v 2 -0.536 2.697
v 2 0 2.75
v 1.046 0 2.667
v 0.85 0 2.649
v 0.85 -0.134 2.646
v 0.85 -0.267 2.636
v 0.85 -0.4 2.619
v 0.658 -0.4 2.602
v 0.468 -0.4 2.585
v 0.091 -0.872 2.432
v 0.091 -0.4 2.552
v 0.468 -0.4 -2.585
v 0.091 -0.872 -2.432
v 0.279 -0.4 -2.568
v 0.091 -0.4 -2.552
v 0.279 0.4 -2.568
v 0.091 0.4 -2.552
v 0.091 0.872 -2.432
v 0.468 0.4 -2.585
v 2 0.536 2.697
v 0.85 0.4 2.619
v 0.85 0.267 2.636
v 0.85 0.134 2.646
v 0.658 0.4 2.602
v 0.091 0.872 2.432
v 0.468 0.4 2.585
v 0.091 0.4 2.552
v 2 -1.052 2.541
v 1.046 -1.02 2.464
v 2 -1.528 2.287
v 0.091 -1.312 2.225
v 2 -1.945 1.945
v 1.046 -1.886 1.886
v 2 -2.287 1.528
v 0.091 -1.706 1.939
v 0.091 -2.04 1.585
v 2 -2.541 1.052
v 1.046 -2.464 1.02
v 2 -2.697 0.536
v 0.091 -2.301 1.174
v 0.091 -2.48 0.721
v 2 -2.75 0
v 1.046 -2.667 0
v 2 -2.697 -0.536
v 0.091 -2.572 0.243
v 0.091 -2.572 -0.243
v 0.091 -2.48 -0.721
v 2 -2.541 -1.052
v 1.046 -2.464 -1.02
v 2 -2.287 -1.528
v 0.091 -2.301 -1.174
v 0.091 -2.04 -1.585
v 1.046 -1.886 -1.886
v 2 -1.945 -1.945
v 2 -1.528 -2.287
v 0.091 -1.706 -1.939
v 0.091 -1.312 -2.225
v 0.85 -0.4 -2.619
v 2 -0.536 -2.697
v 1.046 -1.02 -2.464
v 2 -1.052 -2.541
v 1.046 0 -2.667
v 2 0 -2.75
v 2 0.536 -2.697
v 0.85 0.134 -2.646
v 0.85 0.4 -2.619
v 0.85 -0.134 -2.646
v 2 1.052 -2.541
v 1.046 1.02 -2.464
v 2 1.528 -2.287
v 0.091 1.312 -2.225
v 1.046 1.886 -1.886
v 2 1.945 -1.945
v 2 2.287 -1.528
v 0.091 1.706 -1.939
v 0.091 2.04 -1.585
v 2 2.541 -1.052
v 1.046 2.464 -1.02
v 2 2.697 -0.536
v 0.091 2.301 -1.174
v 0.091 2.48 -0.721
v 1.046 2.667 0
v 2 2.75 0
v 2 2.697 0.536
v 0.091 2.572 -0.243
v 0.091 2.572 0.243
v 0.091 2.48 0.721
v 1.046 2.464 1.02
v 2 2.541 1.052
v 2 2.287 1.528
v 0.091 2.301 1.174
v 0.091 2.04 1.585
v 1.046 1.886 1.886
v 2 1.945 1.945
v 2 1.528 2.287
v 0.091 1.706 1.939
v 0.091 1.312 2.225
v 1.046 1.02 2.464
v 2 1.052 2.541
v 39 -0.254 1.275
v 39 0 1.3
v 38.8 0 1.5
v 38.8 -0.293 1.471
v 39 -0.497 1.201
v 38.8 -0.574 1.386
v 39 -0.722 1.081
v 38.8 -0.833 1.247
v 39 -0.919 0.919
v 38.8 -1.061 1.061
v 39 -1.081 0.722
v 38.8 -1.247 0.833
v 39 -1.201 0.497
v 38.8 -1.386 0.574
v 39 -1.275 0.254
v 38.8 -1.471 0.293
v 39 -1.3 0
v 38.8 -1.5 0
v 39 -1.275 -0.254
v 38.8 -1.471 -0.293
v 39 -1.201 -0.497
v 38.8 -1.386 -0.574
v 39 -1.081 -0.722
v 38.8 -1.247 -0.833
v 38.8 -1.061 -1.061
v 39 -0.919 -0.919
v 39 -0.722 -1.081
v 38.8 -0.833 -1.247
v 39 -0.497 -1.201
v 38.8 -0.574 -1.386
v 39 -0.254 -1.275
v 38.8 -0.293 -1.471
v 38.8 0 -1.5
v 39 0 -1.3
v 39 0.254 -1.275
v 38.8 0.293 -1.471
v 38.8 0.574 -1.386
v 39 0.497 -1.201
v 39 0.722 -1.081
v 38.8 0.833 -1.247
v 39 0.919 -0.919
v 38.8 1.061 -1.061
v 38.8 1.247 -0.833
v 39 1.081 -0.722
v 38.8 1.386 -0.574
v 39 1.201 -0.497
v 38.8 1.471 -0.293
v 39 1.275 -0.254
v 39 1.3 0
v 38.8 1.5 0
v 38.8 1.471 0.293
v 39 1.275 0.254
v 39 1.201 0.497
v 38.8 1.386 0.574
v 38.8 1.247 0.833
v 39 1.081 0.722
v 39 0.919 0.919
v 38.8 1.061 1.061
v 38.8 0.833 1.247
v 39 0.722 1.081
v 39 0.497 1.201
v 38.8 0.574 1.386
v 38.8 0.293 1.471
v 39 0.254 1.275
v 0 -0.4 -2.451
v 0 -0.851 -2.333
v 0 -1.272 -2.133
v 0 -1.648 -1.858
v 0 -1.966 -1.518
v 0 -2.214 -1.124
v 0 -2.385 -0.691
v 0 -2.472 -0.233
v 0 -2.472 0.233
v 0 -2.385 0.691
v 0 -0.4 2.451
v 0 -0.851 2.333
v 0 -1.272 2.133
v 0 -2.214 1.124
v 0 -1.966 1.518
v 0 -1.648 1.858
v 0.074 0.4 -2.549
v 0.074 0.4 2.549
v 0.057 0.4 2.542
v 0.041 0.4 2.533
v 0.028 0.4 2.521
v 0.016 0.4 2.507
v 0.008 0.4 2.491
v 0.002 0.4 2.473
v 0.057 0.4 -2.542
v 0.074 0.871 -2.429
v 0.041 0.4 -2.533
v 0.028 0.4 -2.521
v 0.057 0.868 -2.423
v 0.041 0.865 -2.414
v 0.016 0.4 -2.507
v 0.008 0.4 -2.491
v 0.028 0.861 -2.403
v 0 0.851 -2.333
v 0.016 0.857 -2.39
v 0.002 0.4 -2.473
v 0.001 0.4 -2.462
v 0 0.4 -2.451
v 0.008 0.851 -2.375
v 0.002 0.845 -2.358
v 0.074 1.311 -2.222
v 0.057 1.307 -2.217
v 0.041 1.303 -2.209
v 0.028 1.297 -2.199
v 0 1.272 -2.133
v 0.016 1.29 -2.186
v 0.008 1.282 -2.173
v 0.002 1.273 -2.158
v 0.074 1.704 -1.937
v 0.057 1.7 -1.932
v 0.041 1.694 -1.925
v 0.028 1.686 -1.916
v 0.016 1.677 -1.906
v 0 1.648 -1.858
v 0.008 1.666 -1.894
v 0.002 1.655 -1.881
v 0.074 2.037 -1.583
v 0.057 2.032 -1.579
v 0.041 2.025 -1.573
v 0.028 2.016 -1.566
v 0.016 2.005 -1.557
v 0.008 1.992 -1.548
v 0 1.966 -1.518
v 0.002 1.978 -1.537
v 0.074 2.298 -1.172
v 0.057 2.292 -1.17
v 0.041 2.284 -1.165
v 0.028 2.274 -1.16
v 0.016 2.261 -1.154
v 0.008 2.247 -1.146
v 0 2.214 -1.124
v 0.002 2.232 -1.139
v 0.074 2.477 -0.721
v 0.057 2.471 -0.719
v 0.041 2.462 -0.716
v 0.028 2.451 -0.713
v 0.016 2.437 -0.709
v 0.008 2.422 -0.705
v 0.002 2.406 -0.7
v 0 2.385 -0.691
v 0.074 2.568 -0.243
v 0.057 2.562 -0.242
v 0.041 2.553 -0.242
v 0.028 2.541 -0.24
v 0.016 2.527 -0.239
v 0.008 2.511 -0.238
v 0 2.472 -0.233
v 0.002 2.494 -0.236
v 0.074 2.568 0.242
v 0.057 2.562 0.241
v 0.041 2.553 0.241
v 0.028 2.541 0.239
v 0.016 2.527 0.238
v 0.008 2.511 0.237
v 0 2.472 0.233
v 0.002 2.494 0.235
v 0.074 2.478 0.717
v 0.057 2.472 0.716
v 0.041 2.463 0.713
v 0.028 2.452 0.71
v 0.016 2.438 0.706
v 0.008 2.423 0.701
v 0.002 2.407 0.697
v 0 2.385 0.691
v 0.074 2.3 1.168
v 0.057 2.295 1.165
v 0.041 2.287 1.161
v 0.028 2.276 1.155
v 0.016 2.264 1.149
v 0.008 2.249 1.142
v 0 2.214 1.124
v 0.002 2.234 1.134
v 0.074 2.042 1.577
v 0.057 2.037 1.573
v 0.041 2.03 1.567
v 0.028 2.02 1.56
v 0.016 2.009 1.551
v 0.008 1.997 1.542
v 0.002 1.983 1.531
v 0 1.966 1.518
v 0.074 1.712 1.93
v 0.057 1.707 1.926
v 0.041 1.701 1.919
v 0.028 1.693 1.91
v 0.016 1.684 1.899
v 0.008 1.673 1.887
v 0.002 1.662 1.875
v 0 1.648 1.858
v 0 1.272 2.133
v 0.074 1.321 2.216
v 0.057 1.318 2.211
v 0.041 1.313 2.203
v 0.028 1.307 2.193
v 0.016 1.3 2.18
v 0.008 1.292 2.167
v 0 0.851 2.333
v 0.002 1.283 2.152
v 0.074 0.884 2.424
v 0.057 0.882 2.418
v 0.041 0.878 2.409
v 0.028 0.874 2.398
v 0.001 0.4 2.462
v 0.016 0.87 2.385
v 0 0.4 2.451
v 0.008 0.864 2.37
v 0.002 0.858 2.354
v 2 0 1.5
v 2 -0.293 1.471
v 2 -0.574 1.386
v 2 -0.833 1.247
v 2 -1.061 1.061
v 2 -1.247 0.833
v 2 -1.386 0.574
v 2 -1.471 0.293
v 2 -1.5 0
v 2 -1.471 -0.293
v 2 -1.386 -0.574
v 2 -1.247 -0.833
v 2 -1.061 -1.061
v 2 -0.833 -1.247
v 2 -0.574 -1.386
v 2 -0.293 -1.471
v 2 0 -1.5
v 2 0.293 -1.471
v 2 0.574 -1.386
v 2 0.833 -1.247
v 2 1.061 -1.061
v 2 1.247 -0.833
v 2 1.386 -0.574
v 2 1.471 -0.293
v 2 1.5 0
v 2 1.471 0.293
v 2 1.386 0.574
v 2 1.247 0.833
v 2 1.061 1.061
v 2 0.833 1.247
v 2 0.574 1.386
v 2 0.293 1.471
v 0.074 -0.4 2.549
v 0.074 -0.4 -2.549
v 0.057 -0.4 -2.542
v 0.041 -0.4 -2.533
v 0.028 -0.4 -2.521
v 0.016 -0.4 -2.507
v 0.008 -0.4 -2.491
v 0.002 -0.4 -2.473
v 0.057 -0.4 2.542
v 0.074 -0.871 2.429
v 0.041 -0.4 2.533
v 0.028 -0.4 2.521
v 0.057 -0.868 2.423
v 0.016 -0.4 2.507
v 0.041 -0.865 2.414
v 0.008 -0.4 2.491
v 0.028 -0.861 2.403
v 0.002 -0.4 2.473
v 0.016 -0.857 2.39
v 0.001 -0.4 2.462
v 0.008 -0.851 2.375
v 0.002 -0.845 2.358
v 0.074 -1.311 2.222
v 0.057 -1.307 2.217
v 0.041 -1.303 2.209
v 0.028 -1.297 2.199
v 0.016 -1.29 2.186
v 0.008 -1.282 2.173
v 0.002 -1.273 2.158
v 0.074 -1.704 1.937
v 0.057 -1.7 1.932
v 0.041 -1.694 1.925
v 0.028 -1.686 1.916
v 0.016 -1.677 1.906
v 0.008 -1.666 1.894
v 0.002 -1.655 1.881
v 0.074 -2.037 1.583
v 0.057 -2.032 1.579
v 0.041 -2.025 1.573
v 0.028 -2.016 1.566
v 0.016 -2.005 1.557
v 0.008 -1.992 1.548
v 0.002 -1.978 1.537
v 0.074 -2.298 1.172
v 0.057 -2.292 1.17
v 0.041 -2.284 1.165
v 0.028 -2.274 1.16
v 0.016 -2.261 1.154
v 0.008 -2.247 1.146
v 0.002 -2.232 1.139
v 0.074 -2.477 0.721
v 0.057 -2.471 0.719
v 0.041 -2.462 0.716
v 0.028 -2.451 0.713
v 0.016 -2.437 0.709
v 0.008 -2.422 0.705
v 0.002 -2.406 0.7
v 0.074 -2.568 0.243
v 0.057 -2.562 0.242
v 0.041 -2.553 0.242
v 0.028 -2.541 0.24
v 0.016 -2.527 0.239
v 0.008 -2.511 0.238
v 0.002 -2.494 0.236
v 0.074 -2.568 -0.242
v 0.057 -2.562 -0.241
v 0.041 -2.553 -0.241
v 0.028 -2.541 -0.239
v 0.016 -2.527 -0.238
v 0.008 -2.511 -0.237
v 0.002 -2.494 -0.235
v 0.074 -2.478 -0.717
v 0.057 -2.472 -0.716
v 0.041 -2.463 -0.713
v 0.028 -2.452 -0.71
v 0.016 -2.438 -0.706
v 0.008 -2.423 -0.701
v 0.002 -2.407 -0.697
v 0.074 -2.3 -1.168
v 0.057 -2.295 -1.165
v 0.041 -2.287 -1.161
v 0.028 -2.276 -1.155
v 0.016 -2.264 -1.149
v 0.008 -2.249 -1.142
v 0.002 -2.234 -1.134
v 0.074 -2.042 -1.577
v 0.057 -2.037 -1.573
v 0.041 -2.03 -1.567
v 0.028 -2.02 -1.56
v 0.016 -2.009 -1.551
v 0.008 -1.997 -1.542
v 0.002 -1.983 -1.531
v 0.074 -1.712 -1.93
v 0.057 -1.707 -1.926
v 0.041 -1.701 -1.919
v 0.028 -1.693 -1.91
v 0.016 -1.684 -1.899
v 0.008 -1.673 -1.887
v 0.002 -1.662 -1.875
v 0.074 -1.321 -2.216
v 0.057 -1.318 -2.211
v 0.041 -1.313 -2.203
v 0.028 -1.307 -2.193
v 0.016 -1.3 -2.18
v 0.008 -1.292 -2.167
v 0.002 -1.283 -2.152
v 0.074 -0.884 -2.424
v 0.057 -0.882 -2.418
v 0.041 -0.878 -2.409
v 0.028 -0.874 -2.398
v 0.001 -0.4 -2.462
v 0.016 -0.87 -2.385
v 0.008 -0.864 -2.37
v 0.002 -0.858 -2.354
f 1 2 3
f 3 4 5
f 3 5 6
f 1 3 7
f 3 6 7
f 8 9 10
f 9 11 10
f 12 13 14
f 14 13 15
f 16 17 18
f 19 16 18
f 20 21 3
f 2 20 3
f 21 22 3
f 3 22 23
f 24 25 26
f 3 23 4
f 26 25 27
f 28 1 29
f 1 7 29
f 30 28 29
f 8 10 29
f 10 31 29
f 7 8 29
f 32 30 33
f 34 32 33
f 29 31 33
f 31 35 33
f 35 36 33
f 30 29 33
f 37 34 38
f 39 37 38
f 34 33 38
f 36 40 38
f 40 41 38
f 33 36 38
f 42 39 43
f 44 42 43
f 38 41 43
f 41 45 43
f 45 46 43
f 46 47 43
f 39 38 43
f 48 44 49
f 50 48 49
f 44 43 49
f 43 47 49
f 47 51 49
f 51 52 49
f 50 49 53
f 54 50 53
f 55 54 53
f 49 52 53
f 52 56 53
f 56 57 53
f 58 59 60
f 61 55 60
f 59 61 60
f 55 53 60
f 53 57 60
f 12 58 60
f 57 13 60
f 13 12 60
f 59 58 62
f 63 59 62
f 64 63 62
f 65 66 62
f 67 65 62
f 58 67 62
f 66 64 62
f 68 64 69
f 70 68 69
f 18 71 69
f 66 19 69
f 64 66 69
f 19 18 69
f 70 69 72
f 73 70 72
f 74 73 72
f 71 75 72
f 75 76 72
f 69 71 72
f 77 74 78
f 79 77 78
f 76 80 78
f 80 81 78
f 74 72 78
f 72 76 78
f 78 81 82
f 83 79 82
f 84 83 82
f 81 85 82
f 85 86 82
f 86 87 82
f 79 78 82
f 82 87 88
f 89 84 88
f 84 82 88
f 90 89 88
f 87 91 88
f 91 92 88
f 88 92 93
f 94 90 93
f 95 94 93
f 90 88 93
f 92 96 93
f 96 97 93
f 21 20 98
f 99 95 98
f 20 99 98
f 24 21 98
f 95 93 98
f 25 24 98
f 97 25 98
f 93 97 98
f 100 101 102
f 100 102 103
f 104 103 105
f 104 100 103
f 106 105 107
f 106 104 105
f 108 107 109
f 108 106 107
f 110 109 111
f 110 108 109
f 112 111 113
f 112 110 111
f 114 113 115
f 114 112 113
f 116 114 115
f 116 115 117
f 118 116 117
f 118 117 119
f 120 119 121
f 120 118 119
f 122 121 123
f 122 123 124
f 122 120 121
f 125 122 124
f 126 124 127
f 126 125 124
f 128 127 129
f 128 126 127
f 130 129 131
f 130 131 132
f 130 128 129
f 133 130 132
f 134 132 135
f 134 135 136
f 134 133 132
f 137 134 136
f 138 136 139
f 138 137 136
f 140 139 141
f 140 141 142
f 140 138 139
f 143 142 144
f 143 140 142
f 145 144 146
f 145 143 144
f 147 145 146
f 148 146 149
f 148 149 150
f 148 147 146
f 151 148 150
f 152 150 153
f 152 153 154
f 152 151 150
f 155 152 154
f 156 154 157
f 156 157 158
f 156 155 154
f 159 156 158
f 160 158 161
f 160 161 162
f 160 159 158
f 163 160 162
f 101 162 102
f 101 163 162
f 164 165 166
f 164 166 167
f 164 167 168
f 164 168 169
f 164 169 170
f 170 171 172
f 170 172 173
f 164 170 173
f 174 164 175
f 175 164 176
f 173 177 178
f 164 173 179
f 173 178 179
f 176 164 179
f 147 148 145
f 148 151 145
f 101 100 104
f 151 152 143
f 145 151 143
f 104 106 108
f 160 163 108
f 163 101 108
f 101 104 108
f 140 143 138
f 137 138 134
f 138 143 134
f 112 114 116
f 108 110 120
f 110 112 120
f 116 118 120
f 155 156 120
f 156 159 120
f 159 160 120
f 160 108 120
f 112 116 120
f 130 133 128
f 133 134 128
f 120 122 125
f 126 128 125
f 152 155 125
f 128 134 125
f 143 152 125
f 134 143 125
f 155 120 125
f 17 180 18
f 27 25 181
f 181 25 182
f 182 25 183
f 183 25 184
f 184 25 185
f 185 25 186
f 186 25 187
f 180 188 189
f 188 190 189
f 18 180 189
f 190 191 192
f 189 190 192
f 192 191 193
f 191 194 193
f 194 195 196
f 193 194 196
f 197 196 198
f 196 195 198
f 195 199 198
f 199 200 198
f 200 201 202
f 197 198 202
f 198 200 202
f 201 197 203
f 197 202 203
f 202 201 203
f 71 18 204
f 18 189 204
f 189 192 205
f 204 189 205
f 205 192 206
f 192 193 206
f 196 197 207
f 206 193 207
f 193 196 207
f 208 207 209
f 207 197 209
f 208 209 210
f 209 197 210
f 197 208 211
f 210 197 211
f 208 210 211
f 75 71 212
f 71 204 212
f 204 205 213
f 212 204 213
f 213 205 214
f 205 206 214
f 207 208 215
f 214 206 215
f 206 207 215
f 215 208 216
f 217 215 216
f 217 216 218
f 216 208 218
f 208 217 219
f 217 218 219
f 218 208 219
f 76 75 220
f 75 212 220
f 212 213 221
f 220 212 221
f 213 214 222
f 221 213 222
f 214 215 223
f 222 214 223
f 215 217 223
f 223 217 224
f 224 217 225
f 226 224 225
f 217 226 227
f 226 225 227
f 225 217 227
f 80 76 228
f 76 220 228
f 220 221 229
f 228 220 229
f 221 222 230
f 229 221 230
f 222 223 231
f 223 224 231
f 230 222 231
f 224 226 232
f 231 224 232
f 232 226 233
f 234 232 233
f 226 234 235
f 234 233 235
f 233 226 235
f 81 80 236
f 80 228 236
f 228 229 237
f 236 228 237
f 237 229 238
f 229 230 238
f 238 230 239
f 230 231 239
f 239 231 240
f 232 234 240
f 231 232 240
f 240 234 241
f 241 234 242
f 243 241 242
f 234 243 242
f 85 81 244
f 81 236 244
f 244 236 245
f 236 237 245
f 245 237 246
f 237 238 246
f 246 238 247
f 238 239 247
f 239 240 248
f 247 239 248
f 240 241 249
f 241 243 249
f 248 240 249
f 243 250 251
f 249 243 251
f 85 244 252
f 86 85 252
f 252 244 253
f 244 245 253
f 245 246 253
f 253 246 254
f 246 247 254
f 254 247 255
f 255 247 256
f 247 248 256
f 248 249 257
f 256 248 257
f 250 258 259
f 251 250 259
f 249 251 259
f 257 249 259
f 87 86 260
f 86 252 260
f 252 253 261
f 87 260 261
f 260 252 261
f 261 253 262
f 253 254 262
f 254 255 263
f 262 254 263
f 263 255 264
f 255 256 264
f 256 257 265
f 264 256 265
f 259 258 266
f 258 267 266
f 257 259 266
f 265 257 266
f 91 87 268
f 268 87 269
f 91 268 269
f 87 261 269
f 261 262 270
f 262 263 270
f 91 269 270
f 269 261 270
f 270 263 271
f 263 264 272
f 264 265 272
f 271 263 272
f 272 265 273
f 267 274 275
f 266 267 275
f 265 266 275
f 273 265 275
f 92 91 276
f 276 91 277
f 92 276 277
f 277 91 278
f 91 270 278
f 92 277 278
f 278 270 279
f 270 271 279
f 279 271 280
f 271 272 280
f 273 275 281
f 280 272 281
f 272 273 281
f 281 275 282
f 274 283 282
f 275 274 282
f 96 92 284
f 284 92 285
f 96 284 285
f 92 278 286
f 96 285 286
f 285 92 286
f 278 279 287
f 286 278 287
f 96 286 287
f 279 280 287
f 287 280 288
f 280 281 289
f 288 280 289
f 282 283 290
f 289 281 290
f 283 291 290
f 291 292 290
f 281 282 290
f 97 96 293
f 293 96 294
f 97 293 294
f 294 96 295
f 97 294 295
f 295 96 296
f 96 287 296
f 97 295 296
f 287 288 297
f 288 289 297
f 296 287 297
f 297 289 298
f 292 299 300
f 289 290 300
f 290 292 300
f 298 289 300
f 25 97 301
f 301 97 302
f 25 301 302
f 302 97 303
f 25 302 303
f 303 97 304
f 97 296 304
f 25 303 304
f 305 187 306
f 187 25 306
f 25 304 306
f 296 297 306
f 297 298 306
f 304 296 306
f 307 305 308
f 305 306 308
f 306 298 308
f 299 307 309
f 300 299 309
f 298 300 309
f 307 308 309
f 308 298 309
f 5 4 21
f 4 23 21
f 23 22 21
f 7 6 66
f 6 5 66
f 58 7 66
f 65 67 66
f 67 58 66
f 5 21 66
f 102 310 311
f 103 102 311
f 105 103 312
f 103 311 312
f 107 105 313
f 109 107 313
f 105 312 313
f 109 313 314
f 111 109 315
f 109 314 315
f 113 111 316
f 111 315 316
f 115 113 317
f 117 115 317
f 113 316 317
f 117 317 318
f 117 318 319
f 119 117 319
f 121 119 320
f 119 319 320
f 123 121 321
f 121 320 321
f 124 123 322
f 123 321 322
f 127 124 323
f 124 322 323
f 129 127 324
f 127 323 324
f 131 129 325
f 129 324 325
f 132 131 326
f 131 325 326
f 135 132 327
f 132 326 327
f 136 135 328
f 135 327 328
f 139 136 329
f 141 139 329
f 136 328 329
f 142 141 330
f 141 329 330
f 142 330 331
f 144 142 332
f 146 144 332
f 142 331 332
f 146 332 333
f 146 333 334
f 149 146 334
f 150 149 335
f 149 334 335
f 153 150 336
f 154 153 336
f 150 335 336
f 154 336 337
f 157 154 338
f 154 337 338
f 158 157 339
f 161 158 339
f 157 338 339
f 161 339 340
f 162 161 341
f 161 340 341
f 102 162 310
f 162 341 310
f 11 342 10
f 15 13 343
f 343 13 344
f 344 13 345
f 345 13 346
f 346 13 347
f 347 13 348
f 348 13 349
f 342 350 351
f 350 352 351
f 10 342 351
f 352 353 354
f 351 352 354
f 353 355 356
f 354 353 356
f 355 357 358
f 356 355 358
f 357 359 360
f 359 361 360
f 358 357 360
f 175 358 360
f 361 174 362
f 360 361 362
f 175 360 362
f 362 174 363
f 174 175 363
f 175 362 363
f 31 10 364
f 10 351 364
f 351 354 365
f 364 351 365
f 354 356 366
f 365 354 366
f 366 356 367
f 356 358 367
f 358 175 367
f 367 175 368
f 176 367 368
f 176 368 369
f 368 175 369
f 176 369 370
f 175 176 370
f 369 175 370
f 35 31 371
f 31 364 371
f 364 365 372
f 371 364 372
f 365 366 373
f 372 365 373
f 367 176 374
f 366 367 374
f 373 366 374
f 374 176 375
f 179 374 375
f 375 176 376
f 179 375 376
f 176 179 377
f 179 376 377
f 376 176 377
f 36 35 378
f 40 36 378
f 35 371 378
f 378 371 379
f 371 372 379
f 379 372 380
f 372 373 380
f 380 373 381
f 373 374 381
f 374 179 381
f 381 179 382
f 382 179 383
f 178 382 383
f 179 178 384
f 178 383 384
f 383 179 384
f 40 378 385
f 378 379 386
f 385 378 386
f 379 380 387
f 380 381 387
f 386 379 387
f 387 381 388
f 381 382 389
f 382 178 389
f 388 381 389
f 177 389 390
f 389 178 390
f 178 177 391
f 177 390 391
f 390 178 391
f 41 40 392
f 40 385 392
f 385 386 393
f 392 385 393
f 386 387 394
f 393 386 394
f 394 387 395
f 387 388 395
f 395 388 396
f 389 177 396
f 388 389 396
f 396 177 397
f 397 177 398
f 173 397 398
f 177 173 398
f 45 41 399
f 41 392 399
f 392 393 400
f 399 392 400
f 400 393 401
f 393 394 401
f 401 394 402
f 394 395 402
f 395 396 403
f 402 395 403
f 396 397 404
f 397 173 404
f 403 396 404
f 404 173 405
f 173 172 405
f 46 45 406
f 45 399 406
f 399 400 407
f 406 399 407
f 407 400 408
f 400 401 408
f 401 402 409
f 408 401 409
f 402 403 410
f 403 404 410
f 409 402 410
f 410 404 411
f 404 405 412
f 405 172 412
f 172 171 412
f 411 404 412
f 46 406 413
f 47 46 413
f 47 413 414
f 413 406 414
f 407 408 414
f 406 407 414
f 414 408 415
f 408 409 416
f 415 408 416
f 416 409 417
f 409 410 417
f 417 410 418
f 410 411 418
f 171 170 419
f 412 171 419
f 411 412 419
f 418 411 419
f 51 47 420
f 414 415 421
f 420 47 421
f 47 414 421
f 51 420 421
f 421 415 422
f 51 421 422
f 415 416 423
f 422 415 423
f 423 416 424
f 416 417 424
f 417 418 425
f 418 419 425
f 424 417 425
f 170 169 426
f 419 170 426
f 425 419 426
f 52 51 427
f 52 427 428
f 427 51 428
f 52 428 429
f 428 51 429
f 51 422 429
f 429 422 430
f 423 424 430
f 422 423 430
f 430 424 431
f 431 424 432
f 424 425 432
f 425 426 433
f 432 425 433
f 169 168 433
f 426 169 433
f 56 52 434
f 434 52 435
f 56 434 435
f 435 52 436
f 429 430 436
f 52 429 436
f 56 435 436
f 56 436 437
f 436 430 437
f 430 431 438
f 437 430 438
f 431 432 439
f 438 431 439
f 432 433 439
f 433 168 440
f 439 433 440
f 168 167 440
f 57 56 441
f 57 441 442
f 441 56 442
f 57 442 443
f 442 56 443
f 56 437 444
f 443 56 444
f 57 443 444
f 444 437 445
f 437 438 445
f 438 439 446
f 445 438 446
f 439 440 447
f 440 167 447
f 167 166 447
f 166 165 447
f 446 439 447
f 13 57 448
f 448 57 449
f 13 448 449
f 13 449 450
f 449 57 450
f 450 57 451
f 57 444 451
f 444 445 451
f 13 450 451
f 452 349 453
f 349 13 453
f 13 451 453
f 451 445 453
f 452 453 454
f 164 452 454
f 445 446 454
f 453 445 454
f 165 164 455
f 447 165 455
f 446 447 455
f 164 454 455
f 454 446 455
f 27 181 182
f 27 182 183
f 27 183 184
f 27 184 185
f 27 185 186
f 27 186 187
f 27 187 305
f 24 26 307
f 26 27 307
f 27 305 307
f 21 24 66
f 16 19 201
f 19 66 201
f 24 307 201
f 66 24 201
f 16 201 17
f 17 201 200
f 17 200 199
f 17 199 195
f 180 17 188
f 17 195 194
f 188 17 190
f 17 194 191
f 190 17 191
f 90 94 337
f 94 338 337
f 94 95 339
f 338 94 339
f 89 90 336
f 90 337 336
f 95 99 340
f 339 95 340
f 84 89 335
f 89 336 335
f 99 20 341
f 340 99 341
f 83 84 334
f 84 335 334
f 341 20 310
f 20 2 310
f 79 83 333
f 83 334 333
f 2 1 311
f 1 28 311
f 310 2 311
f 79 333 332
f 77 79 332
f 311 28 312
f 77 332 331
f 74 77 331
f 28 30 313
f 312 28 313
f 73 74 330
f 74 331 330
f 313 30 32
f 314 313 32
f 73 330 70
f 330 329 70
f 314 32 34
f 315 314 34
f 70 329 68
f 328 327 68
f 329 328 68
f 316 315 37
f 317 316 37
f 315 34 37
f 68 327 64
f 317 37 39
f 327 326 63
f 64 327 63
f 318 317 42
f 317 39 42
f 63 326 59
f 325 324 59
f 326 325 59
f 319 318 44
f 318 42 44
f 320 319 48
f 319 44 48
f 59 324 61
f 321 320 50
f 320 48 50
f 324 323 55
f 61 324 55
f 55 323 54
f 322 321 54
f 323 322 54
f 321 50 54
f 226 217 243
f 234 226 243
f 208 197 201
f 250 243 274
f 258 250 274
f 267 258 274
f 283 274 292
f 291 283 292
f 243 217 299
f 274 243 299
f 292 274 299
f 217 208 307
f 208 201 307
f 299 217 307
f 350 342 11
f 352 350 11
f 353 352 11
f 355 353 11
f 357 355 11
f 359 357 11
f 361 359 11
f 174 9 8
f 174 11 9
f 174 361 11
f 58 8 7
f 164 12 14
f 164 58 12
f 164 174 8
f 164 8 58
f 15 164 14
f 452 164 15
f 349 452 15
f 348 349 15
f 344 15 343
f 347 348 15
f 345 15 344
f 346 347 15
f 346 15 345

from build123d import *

# Parameters (mm, degrees)
FILLET2_R     = 0.1
SKETCH2_W     = 5.5
SKETCH2_H     = 0.8
SLOT_DEPTH    = 0.85
CHAMFER1_SIZE = 0.2


with BuildPart() as part:
    # BodySke → Base-Revolve (revolve)
    with BuildSketch(Plane.XY):
        Polygon((2, 1.5), (2, 2.75), (0, 2.575022673), (0, 0), (39, 0), (39, 1.5), align=None)
    revolve(axis=Axis((-25.4, 0, 0), (1, 0, 0)))

    # Fillet2
    fillet2_edges = [part.edges().sort_by_distance(p)[0] for p in [
        (0, -2.575022673, 0),
    ]]
    fillet(fillet2_edges, radius=FILLET2_R)

    # Sketch2 → Slot (cut)
    with BuildSketch(Plane(origin=(0, 0, 0), x_dir=(0, 0, -1), z_dir=(1, 0, 0))):
        Rectangle(SKETCH2_W, SKETCH2_H)
    extrude(amount=SLOT_DEPTH, mode=Mode.SUBTRACT)

    # Chamfer1
    chamfer1_edges = [part.edges().sort_by_distance(p)[0] for p in [
        (39, -1.5, 0),
    ]]
    chamfer(chamfer1_edges, length=CHAMFER1_SIZE)


solid = part.part
